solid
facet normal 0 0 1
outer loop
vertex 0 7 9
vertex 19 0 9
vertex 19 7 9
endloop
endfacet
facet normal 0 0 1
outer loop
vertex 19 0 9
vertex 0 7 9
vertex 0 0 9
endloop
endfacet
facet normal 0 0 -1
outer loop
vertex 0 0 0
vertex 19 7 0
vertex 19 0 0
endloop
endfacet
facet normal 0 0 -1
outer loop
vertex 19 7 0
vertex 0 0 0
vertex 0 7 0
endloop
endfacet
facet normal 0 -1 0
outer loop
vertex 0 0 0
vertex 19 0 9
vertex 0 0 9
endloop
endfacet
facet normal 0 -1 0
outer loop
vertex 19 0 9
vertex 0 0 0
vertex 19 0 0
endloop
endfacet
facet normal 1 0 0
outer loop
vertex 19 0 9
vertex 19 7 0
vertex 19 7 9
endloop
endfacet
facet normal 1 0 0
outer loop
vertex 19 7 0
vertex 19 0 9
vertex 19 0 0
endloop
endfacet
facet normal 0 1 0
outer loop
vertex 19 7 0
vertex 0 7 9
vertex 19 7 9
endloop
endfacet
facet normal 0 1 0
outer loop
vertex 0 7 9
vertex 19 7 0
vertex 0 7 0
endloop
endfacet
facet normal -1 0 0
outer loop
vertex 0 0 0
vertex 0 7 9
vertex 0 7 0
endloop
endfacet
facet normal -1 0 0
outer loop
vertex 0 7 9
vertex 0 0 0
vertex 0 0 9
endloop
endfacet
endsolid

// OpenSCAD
// Generated by SolidPython 1.0.1 on 2020-07-29 00:46:56


cube(size = [19, 7, 9]);
/***********************************************
*********      SolidPython code:      **********
************************************************
 
# import packages: SolidPython
from solid import *
from solid.utils import *
from itertools import chain, combinations, permutations


class Resize:

    def __init__(self, scad_file):
        self.scad_file = scad_file
        #self.scad_file = import_scad(scad_file)
        # cone/cylinder param:
        self.r1 = 0
        self.r2 = 0
        self.h = 0
        # rectangular prism param:
        self.w = 0
        self.l = 0
        # ellipse param:
        self.r = 0

    # import OpenScad code (file name corresponds to shape)


    # classify shape + parameters
    def assign(self, param1, param2, param3):
        if self.scad_file == 'cone.scad':
            self.r1 = param1
            self.r2 = param2
            self.h = param3
        elif self.scad_file == 'cylinder.scad':
            self.r1 = param1
            self.r2 = param2
            self.h = param3
        elif self.scad_file == 'rectangularPrism.scad':
            self.h = param1
            self.l = param2
            self.w = param3
        else:
            self.r = param1
            self.h = param2

    # resize parameters
    def iterate(self):
        x = range(3, 20, 2)
        i = 1
        if self.scad_file == 'cone.scad':
            tempList = list(permutations(x, 2))
            for temp in tempList:
                param1 = temp[0]
                param2 = temp[1]
                filepath = 'produced_scad_files/' + 'cone' + str(param1) + '_' + str(param2) + '_' + '.scad'
                scad_render_to_file(cylinder(h=param1, r1=param2, r2=0), filepath)

        elif self.scad_file == 'cylinder.scad':
            tempList = list(permutations(x, 3))
            for temp in tempList:
                param1 = temp[0]
                param2 = temp[1]
                filepath = 'produced_scad_files/' + 'cylinder' + str(param1) + '_' + str(param2) + '_' + '.scad'
                scad_render_to_file(cylinder(h=param1, r1=param2, r2=param2), filepath)

        elif self.scad_file == 'rectangularPrism.scad':
            tempList = list(permutations(x, 3))
            for temp in tempList:
                param1 = temp[0]
                param2 = temp[1]
                param3 = temp[2]
                filepath = 'produced_scad_files/' + 'rectangularPrism' + str(param1) + '_' + str(param2) + '_' + str(
                    param3) + '.scad'
                scad_render_to_file(cube(size=(param1, param2, param3)), filepath)

        elif self.scad_file == 'ellipse.scad':
            tempList = list(permutations(x, 4))
            for temp in tempList:
                param1 = temp[0]
                param2 = temp[1]
                param3 = temp[2]
                param4 = temp[3]
                filepath = 'produced_scad_files/' + 'ellipse' + str(param1) + '_' + str(param2) + '_' + str(param3) + '_' + str(param4) + '.scad'
                scad_render_to_file(scale([param1, param2, param3])(sphere(r=param4)), filepath)

    def render_to_scadfile(self):
        scad_render_to_file(scad, 'example.scad') 
 
************************************************/
